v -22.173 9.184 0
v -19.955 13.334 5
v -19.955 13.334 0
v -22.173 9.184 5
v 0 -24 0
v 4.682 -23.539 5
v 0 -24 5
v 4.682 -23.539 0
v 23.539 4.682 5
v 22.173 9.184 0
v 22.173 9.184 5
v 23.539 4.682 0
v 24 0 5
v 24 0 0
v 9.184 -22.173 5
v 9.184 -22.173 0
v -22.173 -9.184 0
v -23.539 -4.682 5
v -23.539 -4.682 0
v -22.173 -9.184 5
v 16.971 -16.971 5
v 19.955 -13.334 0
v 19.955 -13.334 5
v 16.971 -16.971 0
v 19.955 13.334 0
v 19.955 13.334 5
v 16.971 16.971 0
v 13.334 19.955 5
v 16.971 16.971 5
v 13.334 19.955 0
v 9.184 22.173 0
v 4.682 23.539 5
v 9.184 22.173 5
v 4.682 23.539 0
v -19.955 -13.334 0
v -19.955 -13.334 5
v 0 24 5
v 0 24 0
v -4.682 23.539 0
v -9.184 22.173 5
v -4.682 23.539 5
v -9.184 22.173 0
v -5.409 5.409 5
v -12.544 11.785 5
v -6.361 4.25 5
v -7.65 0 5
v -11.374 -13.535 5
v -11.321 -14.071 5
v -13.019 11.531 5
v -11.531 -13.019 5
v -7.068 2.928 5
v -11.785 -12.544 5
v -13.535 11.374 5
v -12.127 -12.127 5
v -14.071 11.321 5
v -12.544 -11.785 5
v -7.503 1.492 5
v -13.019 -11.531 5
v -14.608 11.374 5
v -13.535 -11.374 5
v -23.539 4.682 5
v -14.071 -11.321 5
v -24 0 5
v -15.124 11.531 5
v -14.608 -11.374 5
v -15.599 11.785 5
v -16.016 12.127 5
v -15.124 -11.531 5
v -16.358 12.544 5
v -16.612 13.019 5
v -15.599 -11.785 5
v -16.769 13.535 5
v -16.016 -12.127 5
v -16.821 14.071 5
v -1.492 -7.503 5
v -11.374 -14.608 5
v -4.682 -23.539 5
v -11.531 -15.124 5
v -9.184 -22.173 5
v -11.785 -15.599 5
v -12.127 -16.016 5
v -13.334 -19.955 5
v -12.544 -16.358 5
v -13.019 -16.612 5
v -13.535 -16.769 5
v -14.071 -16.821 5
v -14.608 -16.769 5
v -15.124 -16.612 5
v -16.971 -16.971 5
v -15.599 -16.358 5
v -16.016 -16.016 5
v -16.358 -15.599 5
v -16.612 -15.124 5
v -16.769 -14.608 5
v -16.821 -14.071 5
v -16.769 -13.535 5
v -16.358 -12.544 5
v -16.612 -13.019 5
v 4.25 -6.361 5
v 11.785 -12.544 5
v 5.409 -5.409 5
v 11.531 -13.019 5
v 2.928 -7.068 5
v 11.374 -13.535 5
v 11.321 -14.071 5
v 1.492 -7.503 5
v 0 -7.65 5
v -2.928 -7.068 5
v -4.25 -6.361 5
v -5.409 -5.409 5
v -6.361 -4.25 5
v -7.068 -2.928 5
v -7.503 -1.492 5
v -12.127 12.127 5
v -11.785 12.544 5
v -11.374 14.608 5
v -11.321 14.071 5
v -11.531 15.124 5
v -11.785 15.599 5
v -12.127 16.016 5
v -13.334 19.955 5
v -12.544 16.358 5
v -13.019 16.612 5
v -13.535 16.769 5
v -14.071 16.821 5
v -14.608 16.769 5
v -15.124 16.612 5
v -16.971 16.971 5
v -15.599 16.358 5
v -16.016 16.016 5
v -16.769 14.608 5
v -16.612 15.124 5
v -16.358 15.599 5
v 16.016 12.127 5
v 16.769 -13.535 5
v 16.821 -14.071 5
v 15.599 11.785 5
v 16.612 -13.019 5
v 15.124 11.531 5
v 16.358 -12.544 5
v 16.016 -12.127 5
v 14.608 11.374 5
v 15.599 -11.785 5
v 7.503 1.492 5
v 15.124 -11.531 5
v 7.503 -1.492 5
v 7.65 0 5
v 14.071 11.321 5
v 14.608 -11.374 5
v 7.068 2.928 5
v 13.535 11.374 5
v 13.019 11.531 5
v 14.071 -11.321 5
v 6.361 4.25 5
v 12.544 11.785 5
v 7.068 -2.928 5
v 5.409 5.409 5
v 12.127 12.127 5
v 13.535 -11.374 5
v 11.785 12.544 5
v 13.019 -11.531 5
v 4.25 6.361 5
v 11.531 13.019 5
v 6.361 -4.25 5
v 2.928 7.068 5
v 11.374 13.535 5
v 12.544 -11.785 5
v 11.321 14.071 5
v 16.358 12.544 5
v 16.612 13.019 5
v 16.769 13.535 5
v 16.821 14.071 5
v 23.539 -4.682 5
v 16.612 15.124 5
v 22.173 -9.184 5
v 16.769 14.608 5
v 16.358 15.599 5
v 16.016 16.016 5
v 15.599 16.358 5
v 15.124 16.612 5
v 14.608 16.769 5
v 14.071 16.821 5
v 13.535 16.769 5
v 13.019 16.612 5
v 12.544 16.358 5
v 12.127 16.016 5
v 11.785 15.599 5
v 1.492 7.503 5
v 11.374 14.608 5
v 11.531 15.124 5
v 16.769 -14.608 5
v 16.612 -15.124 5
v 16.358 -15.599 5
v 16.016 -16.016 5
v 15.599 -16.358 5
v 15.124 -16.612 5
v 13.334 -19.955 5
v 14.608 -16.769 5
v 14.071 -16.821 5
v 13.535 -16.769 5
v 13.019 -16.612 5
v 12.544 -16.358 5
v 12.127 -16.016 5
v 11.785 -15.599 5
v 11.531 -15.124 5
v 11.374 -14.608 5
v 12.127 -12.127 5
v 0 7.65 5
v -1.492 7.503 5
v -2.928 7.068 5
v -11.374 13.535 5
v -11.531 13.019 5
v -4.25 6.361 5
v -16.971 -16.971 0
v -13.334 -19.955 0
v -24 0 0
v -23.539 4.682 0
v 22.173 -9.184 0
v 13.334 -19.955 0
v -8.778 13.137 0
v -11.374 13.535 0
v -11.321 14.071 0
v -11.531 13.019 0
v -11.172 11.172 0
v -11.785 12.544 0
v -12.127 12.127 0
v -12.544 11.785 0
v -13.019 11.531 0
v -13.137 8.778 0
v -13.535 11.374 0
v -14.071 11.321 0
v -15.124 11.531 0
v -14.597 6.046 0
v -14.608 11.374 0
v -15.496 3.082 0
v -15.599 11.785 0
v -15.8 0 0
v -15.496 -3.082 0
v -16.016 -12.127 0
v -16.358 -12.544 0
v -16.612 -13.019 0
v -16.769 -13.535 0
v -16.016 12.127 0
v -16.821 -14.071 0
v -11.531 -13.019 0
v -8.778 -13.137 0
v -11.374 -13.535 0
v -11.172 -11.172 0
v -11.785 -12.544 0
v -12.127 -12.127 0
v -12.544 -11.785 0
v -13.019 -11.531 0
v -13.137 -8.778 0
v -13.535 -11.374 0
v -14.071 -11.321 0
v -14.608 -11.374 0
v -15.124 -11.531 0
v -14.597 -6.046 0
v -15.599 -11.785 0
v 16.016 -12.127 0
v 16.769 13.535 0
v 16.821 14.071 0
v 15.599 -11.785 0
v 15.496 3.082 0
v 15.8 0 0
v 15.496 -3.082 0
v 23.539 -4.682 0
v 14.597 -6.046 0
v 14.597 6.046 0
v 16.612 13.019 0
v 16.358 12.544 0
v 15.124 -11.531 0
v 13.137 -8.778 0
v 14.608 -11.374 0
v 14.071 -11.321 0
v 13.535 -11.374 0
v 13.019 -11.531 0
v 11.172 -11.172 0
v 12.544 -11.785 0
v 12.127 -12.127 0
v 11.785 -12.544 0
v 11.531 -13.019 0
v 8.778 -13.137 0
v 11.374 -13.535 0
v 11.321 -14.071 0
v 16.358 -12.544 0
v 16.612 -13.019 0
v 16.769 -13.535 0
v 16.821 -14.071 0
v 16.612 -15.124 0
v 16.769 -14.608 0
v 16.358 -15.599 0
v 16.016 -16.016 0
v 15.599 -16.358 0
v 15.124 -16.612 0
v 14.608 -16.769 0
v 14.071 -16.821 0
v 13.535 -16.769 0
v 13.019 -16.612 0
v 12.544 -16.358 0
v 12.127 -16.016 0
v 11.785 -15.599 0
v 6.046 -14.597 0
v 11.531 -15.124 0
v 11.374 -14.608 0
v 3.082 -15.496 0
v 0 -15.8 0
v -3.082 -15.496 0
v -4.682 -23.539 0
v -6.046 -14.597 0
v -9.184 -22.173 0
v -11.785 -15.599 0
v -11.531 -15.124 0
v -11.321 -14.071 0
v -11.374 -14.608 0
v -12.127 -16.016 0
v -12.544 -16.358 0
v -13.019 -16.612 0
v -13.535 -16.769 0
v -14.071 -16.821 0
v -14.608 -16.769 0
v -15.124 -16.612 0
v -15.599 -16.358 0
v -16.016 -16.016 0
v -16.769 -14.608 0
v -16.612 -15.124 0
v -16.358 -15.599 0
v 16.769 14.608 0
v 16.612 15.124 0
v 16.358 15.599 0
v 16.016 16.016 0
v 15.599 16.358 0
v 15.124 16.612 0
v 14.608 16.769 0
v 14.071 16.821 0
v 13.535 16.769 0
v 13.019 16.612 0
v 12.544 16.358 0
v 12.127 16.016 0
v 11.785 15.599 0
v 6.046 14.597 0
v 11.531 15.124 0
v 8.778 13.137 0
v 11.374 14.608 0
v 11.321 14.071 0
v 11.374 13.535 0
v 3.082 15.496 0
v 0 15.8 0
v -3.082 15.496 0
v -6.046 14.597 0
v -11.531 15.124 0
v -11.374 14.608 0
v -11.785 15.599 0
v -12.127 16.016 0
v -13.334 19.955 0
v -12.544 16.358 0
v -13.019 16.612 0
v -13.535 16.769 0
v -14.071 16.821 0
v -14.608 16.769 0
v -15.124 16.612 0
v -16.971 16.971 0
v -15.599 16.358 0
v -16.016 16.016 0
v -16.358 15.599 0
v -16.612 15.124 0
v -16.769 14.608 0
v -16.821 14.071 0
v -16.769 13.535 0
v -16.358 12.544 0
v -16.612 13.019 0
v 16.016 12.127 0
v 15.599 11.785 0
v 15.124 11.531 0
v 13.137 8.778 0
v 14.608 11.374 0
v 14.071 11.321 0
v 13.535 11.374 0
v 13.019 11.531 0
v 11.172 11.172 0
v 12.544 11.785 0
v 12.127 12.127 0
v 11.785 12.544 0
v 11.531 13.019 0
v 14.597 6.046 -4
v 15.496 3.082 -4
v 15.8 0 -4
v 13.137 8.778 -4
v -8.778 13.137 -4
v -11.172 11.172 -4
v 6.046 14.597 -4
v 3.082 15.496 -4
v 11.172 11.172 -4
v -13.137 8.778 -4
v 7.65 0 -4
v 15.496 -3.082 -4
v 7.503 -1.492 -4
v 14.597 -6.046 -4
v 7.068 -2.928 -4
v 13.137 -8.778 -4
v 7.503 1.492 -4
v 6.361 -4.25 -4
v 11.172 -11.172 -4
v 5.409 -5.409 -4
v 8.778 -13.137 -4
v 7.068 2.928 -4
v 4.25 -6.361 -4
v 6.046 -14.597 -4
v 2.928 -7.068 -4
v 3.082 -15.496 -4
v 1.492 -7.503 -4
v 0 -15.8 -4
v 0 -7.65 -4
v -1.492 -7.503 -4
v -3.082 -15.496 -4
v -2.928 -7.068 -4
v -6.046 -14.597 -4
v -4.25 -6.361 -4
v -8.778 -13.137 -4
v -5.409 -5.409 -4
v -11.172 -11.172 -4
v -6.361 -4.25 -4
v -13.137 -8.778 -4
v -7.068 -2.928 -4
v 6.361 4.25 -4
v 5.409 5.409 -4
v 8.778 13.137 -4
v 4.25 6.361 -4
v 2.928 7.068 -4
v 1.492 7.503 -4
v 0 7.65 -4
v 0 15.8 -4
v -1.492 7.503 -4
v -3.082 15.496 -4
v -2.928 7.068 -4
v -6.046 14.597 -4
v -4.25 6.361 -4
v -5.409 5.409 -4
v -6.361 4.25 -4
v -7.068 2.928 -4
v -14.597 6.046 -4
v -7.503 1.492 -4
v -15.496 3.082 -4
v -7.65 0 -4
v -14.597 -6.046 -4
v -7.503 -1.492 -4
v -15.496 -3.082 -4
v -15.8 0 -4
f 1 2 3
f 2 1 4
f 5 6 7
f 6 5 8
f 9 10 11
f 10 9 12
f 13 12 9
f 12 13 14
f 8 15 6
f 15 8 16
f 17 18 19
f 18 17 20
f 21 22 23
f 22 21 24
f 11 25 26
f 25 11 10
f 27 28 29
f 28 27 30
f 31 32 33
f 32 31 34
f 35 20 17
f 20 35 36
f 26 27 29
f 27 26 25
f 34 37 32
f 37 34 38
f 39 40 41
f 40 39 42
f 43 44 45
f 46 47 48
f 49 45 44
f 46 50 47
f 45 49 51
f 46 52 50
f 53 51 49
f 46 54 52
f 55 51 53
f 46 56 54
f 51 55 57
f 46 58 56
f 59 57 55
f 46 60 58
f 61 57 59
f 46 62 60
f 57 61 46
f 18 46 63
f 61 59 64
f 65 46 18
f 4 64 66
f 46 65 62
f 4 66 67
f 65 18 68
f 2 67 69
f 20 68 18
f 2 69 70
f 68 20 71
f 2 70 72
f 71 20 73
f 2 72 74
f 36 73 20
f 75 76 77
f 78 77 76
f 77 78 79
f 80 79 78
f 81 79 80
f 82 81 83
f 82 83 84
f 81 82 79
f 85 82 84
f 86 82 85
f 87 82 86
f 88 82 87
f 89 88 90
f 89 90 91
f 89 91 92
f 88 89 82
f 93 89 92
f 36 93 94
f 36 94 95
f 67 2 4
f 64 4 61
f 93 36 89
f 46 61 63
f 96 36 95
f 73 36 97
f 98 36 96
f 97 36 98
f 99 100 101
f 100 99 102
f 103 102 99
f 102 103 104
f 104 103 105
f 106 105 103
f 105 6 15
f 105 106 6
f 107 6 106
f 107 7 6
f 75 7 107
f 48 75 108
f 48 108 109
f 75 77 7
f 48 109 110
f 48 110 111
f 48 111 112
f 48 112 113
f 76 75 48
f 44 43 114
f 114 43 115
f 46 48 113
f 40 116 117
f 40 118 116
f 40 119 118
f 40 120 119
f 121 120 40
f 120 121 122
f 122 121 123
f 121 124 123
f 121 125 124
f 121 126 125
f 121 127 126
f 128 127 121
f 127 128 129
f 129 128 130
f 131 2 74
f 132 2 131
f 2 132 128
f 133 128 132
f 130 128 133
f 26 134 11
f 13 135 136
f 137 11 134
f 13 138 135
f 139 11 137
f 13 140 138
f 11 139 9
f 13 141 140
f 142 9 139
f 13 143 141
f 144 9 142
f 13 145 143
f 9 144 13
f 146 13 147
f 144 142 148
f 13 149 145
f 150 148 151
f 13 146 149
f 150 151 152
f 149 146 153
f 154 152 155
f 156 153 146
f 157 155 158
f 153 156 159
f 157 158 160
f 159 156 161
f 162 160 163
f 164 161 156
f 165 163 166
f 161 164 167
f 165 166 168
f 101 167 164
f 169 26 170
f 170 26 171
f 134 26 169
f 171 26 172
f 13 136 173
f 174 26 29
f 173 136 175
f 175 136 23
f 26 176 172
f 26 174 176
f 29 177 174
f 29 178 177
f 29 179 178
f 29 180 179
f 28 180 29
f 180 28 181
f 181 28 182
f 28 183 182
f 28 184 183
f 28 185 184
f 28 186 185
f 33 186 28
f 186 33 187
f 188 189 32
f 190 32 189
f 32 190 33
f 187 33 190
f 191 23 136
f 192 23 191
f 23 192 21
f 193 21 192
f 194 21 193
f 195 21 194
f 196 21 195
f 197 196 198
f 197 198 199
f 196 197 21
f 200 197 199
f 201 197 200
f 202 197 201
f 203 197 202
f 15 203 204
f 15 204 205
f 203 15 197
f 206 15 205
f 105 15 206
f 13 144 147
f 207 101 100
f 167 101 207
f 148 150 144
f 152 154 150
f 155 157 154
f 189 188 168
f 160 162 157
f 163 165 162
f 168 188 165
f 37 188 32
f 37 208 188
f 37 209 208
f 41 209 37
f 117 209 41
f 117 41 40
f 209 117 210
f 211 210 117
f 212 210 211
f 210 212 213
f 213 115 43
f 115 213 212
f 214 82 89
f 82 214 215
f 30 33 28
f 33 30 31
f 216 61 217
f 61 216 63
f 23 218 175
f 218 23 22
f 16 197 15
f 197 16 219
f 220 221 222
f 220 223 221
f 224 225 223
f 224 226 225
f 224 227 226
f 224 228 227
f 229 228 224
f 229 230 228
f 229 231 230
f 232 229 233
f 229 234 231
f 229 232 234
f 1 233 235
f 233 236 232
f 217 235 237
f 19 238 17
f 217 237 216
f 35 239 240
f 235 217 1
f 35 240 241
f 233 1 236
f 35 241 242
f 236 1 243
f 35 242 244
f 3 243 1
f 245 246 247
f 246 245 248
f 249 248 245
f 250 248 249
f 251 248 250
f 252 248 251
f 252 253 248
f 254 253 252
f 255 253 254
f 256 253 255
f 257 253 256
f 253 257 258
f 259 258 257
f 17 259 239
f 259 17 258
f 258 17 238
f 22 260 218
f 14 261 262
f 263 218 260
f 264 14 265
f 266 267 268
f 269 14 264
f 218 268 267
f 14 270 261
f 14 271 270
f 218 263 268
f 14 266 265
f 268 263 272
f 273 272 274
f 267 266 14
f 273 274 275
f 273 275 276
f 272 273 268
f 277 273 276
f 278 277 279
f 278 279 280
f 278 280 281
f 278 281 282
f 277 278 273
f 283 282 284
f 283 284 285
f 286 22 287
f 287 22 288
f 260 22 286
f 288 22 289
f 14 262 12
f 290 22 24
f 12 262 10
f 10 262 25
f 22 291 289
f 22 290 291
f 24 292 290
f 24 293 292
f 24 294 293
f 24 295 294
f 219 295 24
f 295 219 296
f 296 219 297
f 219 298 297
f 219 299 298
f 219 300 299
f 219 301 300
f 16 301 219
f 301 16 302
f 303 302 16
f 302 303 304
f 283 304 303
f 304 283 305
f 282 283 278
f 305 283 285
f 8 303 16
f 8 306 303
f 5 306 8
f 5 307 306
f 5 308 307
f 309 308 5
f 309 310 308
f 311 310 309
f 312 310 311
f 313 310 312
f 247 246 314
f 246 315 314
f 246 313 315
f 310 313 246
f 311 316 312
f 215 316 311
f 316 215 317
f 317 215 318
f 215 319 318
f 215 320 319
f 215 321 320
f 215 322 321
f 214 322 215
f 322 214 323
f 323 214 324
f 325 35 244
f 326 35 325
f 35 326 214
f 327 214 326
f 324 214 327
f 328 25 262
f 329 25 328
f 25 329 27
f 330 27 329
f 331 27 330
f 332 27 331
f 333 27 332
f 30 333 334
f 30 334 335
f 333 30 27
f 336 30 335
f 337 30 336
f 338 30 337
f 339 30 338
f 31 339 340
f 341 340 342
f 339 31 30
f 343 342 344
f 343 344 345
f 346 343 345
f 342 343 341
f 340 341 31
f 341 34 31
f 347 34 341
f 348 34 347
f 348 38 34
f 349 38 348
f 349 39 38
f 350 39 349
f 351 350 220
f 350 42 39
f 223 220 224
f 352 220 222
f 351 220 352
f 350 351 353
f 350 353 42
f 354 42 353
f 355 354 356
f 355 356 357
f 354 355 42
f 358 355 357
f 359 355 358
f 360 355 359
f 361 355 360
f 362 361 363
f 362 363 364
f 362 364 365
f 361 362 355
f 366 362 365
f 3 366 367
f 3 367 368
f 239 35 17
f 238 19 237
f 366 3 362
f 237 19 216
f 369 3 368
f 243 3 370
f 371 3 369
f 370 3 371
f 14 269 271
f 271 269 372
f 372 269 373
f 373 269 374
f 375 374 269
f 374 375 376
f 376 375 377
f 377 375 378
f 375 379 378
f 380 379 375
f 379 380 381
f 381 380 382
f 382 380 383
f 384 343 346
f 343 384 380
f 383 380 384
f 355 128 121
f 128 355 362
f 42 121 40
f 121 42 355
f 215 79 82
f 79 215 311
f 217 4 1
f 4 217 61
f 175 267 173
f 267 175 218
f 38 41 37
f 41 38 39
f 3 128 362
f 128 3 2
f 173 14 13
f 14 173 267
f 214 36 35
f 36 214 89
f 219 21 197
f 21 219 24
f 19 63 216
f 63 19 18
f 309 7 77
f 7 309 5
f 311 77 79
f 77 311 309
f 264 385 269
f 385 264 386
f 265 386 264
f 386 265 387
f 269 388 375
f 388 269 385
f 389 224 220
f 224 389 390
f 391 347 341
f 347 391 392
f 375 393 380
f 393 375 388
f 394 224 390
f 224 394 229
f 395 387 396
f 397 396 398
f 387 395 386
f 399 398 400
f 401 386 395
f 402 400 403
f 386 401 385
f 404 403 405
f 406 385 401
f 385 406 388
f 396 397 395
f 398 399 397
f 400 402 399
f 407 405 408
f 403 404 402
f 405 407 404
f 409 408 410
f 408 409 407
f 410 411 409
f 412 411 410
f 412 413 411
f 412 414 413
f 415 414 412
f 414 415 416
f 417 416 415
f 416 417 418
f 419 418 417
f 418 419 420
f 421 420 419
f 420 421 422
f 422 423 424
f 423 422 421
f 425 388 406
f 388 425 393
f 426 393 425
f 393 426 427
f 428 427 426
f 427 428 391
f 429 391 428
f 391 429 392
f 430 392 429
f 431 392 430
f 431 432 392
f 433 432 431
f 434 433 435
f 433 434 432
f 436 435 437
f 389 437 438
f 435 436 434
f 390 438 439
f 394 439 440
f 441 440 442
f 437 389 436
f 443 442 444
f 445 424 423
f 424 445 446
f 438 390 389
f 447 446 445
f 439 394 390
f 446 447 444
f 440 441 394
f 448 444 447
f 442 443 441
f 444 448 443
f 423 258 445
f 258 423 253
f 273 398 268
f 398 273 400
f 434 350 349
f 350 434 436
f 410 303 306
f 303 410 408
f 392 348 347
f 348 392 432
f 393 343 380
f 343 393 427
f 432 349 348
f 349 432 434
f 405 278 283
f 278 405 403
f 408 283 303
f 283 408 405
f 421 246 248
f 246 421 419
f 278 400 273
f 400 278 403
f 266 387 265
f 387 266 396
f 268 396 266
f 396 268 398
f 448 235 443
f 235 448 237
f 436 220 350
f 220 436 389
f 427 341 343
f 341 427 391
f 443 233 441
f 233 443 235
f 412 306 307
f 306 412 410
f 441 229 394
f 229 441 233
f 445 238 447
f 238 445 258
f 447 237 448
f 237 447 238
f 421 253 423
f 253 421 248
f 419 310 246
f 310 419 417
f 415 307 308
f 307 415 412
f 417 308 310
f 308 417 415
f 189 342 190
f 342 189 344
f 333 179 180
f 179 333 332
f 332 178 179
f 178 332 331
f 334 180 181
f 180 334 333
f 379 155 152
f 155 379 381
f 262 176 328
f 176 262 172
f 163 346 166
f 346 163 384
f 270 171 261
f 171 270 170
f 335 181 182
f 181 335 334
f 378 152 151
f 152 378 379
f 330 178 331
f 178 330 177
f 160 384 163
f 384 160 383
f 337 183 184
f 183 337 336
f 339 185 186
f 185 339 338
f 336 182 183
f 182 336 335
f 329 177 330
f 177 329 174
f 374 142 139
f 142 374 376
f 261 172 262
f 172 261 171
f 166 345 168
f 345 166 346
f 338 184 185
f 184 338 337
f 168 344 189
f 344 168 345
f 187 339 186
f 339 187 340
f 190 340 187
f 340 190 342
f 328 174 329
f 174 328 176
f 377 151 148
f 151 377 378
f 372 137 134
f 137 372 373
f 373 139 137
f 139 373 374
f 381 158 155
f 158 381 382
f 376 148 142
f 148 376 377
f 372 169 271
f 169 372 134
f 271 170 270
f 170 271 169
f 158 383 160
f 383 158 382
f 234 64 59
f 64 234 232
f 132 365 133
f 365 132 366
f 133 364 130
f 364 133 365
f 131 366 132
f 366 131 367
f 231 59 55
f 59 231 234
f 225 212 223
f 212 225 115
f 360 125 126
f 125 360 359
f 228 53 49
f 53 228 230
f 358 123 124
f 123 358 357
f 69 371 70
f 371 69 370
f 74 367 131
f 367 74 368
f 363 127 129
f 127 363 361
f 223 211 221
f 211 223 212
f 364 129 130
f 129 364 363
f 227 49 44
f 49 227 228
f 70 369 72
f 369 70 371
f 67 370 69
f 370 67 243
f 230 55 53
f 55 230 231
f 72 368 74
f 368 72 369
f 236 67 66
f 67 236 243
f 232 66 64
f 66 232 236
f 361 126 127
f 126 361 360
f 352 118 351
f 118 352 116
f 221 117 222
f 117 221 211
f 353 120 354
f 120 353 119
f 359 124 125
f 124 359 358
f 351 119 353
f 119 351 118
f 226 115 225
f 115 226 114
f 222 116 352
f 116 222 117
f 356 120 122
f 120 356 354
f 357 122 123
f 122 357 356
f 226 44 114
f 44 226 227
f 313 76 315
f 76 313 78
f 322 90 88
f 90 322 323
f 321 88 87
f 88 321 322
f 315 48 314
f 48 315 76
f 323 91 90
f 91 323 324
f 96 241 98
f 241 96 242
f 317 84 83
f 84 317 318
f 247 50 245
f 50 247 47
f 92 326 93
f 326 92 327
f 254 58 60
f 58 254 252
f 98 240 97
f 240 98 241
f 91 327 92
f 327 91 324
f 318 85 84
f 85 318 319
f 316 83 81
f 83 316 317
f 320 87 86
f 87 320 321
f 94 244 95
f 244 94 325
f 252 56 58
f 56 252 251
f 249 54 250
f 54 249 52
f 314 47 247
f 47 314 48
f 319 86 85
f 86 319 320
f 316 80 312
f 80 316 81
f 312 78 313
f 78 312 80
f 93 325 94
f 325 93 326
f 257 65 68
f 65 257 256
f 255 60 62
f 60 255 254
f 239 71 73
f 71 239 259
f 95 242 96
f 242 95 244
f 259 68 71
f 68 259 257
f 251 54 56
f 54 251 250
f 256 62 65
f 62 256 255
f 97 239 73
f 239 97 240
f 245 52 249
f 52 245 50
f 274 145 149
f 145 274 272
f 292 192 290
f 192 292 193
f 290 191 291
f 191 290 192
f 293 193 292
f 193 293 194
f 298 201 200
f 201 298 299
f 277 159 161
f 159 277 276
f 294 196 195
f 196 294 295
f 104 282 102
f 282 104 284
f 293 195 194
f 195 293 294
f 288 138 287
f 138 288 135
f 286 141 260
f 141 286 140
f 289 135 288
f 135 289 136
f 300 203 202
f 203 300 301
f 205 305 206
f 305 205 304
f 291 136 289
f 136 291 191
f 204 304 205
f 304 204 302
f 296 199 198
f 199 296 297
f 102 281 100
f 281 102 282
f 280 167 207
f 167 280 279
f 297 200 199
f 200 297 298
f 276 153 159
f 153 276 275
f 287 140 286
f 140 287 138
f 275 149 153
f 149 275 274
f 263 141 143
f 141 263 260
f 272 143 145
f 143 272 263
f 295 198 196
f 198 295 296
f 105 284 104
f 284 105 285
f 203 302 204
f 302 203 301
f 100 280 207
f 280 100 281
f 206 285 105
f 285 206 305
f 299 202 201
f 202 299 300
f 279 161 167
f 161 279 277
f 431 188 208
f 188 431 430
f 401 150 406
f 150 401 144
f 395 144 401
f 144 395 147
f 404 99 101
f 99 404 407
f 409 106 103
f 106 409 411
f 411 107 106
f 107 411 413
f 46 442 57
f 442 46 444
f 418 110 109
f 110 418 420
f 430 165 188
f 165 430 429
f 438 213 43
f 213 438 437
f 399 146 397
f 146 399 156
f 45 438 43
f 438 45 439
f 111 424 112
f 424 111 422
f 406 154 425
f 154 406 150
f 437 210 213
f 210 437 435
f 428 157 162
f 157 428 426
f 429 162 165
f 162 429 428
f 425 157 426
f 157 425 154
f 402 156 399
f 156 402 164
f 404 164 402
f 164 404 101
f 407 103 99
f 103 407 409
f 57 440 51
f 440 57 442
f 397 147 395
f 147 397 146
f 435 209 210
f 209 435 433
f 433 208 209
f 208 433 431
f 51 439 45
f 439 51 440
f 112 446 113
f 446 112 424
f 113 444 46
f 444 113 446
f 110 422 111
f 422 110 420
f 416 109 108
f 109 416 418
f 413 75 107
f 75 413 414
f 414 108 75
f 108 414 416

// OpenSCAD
$fn = 32;

// ----------------------------------------------------------------------
// Retaining cap: 6002 cover, 48 mm, spigot 31.6 mm
// ----------------------------------------------------------------------

// --- parameters (mm) ---
cap_d = 48;               // cover diameter
cap_t = 5;                // cover thickness
lip_d = 31.6;             // spigot that enters the housing
lip_h = 4;                // spigot height
shaft_d = 15.3;           // shaft opening
bolt_d = 5.5;             // bolt clearance
bolt_r = 19.9;            // bolt circle radius

module cover() {
  cylinder(h = cap_t, d = cap_d);
}

module spigot() {
  /* sunk 1 mm into the cover; the spigot sets the overall height */
  translate([0, 0, -lip_h]) cylinder(h = lip_h + 1, d = lip_d);
}

difference() {
  union() {
    cover();
    spigot();
  }
  for (i = [0 : 3]) rotate([0, 0, 45 + i * 90]) translate([bolt_r, 0, -lip_h - 1])
    cylinder(h = lip_h + cap_t + 2, d = bolt_d);
  translate([0, 0, -lip_h - 1]) cylinder(h = lip_h + cap_t + 2, d = shaft_d);
}
